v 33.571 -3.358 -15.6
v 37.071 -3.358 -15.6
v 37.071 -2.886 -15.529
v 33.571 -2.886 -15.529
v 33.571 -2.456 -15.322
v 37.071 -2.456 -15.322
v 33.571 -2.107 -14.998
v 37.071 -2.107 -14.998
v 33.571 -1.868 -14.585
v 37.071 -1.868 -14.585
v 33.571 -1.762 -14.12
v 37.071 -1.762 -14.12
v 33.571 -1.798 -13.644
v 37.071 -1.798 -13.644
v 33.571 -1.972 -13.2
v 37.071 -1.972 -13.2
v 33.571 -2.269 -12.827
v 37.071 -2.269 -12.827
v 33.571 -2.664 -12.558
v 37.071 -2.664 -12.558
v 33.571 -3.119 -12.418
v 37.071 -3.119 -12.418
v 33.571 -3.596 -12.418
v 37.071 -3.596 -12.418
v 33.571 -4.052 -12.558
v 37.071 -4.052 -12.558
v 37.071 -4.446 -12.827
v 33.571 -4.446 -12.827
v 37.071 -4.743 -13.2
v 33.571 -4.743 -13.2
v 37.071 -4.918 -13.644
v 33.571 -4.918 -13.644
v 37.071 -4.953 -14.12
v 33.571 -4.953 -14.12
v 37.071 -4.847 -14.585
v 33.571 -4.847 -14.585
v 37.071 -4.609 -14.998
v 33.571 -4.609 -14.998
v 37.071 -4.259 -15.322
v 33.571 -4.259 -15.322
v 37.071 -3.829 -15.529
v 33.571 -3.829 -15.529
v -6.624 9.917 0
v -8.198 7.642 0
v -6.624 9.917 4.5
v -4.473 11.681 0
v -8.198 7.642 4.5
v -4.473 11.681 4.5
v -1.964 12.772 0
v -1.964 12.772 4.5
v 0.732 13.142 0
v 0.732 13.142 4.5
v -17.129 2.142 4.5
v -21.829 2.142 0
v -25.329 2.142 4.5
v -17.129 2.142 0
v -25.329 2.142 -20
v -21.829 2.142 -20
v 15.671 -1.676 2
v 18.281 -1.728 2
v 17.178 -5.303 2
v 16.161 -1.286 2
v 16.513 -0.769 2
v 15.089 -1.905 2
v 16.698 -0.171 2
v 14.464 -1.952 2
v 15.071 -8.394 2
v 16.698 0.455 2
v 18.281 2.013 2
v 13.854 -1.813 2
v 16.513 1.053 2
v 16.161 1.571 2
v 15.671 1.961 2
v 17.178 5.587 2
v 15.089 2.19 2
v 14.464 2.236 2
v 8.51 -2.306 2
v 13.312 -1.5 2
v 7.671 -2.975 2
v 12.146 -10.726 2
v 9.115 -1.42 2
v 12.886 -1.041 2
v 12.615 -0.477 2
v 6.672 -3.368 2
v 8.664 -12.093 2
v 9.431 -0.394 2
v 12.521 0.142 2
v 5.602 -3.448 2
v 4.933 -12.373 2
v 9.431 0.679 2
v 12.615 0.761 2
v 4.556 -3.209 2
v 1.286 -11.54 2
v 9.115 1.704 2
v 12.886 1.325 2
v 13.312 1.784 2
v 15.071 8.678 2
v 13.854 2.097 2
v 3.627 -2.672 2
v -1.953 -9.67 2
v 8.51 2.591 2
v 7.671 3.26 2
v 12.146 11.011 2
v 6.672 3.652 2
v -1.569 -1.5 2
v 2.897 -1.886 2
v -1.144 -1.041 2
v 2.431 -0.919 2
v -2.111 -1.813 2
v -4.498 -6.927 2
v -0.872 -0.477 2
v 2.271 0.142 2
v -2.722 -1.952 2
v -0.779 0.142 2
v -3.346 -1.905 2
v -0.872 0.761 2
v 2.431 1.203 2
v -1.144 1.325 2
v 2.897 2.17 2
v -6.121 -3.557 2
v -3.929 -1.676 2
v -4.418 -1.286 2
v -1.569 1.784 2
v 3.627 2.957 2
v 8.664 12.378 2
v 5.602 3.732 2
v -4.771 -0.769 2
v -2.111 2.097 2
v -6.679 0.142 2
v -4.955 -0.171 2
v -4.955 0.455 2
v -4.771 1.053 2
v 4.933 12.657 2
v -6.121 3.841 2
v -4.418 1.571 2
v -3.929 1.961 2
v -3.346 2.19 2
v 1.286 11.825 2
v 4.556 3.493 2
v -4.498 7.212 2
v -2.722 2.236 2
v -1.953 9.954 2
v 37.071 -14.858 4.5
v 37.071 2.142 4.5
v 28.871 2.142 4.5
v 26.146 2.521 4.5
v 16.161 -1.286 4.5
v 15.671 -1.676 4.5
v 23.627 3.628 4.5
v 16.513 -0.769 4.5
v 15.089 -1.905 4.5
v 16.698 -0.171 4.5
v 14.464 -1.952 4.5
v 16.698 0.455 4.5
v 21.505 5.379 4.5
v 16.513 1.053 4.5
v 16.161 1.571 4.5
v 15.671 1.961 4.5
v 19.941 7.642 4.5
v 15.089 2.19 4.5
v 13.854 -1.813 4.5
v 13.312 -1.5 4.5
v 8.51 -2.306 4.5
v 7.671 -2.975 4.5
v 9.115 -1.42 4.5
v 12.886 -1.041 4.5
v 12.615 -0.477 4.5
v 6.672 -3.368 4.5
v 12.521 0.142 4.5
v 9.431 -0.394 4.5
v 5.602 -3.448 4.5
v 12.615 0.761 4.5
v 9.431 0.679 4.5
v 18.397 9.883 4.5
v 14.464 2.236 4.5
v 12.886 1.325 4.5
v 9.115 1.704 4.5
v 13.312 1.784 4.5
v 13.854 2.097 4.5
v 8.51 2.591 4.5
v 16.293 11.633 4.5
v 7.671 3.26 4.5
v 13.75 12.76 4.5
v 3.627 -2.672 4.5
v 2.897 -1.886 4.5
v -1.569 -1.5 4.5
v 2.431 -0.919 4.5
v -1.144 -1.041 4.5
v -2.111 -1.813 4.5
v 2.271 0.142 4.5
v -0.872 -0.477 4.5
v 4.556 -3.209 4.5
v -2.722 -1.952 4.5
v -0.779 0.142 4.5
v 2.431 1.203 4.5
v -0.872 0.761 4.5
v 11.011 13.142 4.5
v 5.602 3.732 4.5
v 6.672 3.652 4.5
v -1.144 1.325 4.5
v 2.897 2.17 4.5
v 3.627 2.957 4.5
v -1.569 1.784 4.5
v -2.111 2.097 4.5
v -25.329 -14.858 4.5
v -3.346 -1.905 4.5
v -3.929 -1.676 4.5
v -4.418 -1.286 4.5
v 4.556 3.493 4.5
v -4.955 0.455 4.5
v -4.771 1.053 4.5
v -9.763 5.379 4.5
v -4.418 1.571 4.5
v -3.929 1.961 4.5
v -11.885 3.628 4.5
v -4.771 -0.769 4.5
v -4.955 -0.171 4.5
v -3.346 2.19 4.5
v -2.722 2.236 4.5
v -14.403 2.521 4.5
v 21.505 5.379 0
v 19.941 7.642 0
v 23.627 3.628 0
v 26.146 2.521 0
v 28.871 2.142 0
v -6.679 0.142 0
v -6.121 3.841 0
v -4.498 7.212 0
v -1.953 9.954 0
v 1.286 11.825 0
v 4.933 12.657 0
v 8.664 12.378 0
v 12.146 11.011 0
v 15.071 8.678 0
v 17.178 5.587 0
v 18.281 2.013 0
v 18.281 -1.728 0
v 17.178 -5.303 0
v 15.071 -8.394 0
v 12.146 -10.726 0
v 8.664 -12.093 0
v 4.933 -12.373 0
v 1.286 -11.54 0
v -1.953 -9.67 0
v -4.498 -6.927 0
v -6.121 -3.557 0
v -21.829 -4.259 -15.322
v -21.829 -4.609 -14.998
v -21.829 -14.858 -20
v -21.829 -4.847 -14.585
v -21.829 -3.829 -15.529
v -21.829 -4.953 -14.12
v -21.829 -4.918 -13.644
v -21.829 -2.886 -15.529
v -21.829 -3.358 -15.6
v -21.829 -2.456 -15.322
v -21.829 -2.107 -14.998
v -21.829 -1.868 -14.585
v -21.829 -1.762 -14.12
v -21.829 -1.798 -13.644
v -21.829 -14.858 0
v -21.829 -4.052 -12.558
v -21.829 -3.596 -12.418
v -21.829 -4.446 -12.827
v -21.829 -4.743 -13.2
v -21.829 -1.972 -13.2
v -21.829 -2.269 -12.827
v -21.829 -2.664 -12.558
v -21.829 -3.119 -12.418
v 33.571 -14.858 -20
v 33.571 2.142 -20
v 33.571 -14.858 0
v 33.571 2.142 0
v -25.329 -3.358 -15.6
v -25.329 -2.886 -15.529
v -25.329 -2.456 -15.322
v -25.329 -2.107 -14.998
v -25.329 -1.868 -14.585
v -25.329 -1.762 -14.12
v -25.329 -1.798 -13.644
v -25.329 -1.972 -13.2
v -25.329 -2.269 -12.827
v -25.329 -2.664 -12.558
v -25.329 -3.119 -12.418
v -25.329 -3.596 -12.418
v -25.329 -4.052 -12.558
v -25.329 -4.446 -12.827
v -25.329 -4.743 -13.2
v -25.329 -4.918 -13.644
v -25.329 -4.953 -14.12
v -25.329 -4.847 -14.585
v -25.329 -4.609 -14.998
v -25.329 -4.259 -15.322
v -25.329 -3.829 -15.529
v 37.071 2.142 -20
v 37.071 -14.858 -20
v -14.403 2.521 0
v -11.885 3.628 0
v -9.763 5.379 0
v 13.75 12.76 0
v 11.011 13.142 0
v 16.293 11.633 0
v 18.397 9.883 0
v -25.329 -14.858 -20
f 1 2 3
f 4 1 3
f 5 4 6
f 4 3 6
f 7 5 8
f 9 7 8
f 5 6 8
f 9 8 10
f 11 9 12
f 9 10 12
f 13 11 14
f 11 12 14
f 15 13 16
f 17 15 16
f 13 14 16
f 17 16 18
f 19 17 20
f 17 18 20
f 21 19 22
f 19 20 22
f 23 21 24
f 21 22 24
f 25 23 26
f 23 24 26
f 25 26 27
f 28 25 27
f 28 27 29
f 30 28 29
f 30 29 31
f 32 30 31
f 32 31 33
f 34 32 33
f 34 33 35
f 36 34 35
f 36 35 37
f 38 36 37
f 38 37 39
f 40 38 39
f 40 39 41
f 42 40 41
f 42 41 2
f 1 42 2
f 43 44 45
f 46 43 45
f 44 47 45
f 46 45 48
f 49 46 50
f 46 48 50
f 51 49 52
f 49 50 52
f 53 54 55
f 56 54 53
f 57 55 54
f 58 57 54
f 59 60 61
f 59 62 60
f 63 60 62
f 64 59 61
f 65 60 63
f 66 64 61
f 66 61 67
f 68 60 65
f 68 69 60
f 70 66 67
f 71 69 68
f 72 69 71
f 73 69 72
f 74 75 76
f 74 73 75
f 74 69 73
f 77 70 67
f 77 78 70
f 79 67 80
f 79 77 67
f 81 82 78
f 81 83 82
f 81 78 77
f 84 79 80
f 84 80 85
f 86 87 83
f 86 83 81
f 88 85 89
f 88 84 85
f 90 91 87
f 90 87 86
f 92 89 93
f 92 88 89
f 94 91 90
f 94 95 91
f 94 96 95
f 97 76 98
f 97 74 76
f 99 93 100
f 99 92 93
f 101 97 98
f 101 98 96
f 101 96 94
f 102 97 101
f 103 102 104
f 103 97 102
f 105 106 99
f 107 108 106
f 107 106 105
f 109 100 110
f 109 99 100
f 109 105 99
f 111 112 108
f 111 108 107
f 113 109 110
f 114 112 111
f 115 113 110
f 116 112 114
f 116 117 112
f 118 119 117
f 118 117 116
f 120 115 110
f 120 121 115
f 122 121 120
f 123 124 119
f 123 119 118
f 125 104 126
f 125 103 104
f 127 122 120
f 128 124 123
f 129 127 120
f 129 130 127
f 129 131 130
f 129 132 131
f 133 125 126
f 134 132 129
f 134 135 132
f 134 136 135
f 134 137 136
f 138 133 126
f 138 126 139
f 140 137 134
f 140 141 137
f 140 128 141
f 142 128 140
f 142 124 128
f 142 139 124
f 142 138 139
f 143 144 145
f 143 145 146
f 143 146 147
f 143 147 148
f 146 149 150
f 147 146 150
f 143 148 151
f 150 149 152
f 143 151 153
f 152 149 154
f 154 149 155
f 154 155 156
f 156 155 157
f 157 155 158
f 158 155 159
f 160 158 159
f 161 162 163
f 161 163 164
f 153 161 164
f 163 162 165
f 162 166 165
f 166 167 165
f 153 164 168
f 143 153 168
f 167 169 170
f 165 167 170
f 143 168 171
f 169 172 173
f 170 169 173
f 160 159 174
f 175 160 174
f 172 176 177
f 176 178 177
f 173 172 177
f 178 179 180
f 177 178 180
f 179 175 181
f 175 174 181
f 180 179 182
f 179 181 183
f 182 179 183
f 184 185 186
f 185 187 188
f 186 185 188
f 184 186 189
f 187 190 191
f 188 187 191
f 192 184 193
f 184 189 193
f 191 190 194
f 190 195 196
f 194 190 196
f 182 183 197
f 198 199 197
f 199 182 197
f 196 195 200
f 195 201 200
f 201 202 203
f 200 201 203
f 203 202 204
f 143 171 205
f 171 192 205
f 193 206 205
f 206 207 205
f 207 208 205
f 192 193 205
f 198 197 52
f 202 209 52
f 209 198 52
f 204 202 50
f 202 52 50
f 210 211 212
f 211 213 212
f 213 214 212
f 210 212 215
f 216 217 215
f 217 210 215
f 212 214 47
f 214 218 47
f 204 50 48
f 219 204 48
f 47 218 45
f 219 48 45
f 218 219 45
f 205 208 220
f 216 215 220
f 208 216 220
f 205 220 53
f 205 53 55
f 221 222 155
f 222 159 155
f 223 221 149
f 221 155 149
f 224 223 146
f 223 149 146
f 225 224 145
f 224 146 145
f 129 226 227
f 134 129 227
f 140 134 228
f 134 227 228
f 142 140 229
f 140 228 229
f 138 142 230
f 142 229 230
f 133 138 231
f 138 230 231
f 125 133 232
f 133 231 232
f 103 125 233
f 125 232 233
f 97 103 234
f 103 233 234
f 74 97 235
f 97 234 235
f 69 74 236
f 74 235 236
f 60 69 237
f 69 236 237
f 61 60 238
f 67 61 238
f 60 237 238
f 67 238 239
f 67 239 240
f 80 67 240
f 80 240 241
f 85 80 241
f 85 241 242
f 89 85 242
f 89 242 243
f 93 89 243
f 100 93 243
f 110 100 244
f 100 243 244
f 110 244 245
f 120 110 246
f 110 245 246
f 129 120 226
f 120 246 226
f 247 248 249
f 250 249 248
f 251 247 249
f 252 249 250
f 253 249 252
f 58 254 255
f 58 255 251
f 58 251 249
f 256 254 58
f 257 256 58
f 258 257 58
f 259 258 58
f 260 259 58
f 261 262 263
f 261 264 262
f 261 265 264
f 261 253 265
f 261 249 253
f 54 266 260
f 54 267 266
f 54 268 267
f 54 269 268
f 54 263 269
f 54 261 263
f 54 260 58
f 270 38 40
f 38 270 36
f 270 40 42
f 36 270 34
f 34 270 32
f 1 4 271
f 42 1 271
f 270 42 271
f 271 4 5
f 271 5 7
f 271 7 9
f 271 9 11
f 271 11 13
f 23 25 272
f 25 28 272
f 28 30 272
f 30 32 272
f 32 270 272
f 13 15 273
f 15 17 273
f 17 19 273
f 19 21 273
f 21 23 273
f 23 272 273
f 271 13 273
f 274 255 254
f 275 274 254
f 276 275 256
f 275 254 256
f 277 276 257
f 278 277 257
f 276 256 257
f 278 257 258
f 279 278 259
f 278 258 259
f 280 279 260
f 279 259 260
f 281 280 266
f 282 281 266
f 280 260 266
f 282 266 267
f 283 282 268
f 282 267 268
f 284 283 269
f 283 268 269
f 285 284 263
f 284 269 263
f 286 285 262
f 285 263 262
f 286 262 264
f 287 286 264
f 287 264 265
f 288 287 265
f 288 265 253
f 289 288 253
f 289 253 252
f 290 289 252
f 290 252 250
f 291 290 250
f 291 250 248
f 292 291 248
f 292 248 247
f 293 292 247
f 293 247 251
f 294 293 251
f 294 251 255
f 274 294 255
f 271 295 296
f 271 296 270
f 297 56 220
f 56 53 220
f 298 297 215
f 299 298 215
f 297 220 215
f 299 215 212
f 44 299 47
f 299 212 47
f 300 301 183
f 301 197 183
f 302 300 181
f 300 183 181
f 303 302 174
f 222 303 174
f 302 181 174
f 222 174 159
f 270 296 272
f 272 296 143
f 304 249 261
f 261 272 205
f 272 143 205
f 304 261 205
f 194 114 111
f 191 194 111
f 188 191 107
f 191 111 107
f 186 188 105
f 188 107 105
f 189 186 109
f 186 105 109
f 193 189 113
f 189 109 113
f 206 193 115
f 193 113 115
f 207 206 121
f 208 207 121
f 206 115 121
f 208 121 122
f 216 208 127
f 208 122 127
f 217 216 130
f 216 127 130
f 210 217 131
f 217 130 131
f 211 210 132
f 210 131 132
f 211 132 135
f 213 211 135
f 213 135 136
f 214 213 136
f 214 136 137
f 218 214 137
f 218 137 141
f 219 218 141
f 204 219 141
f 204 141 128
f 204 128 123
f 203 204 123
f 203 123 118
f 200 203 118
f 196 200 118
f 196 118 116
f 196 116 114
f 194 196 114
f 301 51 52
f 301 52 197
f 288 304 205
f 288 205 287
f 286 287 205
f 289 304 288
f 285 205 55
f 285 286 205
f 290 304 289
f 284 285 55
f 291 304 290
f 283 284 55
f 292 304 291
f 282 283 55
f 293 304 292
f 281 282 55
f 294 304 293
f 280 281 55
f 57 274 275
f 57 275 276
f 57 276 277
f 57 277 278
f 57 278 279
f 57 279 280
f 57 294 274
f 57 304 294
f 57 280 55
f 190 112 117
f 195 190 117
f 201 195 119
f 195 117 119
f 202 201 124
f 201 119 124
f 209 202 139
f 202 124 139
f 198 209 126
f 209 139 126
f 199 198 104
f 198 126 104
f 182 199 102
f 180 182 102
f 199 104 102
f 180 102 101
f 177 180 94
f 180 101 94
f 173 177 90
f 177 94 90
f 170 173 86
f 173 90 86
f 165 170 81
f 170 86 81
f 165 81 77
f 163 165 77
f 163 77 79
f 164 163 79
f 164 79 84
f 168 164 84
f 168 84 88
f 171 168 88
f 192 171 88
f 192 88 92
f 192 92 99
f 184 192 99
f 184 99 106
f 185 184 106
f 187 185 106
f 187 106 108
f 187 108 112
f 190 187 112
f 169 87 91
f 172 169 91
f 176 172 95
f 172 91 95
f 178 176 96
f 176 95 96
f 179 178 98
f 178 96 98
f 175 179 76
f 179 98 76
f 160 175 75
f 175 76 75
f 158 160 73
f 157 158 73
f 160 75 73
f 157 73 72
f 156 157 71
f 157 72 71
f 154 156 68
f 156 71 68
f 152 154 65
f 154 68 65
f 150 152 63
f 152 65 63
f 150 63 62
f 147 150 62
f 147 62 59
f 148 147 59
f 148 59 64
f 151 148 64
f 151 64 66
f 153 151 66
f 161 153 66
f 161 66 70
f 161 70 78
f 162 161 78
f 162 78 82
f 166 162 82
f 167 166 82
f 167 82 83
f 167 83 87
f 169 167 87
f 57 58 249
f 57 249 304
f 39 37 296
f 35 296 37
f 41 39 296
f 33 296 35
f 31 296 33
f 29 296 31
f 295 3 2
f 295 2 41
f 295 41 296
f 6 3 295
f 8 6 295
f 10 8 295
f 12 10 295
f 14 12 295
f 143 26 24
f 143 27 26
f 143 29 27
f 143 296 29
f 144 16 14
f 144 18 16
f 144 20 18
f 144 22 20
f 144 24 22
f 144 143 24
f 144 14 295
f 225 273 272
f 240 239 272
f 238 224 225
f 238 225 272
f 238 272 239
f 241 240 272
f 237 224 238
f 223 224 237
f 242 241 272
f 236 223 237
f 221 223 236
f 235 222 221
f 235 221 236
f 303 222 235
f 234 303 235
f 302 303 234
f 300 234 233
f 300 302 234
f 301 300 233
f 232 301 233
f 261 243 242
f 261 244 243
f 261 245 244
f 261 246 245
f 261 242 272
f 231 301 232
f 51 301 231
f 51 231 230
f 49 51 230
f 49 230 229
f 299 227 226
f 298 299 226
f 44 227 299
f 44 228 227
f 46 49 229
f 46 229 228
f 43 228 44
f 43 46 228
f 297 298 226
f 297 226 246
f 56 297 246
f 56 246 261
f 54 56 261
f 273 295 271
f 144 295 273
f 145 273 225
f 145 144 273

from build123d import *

# Parameters (mm, degrees)
BOSS_EXTRUDE1_DEPTH = 4.5
SKETCH4_R           = 12.55
CUT_EXTRUDE1_DEPTH  = 2
CUT_EXTRUDE2_REACH  = 42.016
SKETCH5_R           = 2.1
SKETCH5_R_2         = 3.6
SKETCH8_W           = 3.5
SKETCH8_H           = 17
BOSS_EXTRUDE3_DEPTH = 20
FILLET3_R           = 10
FILLET4_R           = 10
SKETCH9_R           = 1.6
CUT_EXTRUDE3_DEPTH  = 68.190127898


with BuildPart() as part:
    # Sketch3 → Boss-Extrude1 (new body)
    with BuildSketch(Plane.XY):
        Polygon((-7.128665208, 13.142231947), (18.871334792, 13.142231947), (18.871334792, 2.142231947), (37.071334792, 2.142231947), (37.071334792, -14.857768053), (-25.328665208, -14.857768053), (-25.328665208, 2.142231947), (-7.128665208, 2.142231947), align=None)
    extrude(amount=BOSS_EXTRUDE1_DEPTH)

    # Sketch4 → Cut-Extrude1 (cut)
    with BuildSketch(Plane(origin=(0, 0, 0), x_dir=(-1, 0, 0), z_dir=(0, 0, -1))):
        with Locations((-5.871334792, 0.142231947)):
            Circle(SKETCH4_R)
    extrude(amount=-CUT_EXTRUDE1_DEPTH, mode=Mode.SUBTRACT)

    # Sketch5 → Cut-Extrude2 (cut, up to next)
    with BuildSketch(Plane(origin=(0, 0, 2), x_dir=(-1, 0, 0), z_dir=(0, 0, -1)), mode=Mode.PRIVATE) as cut_extrude2_sk1:
        with Locations((-14.621334792, 0.142231947)):
            Circle(SKETCH5_R)
    cut_extrude2_tool1 = extrude(cut_extrude2_sk1.sketch, amount=-CUT_EXTRUDE2_REACH, mode=Mode.PRIVATE) & part.part
    # Sketch5 → Cut-Extrude2 (cut, up to next)
    with BuildSketch(Plane(origin=(0, 0, 2), x_dir=(-1, 0, 0), z_dir=(0, 0, -1)), mode=Mode.PRIVATE) as cut_extrude2_sk2:
        with Locations(Location((2.878665208, 0.142231947, 0), (0, 0, 180))):
            Circle(SKETCH5_R)
    cut_extrude2_tool2 = extrude(cut_extrude2_sk2.sketch, amount=-CUT_EXTRUDE2_REACH, mode=Mode.PRIVATE) & part.part
    # Sketch5 → Cut-Extrude2 (cut, up to next)
    with BuildSketch(Plane(origin=(0, 0, 2), x_dir=(-1, 0, 0), z_dir=(0, 0, -1)), mode=Mode.PRIVATE) as cut_extrude2_sk3:
        with Locations((-5.871334792, 0.142231947)):
            Circle(SKETCH5_R_2)
    cut_extrude2_tool3 = extrude(cut_extrude2_sk3.sketch, amount=-CUT_EXTRUDE2_REACH, mode=Mode.PRIVATE) & part.part
    add(cut_extrude2_tool1.solids().sort_by_distance((14.621335, 0.142232, 2))[0], mode=Mode.SUBTRACT)
    add(cut_extrude2_tool2.solids().sort_by_distance((-2.878665, 0.142232, 2))[0], mode=Mode.SUBTRACT)
    add(cut_extrude2_tool3.solids().sort_by_distance((5.871335, 0.142232, 2))[0], mode=Mode.SUBTRACT)

    # Sketch8 → Boss-Extrude3 (add)
    with BuildSketch(Plane(origin=(0, 0, 0), x_dir=(-1, 0, 0), z_dir=(0, 0, -1))):
        with Locations((-35.321334792, -6.357768053)):
            Rectangle(SKETCH8_W, SKETCH8_H)
        with Locations((23.578665208, -6.357768053)):
            Rectangle(SKETCH8_W, SKETCH8_H)
    extrude(amount=BOSS_EXTRUDE3_DEPTH)

    # Fillet3
    fillet3_edges = [part.edges().sort_by_distance(p)[0] for p in [
        (-7.128665208, 2.142231947, 2.25),
        (18.871334792, 2.142231947, 2.25),
    ]]
    fillet(fillet3_edges, radius=FILLET3_R)

    # Fillet4
    fillet4_edges = [part.edges().sort_by_distance(p)[0] for p in [
        (-7.128665208, 13.142231947, 2.25),
        (18.871334792, 13.142231947, 2.25),
    ]]
    fillet(fillet4_edges, radius=FILLET4_R)

    # Sketch9 → Cut-Extrude3 (cut, through all)
    with BuildSketch(Plane(origin=(37.071334792, 0, 0), x_dir=(0, 0, -1), z_dir=(1, 0, 0))):
        with Locations((14, -3.357768053)):
            Circle(SKETCH9_R)
    extrude(amount=-CUT_EXTRUDE3_DEPTH, mode=Mode.SUBTRACT)


solid = part.part
